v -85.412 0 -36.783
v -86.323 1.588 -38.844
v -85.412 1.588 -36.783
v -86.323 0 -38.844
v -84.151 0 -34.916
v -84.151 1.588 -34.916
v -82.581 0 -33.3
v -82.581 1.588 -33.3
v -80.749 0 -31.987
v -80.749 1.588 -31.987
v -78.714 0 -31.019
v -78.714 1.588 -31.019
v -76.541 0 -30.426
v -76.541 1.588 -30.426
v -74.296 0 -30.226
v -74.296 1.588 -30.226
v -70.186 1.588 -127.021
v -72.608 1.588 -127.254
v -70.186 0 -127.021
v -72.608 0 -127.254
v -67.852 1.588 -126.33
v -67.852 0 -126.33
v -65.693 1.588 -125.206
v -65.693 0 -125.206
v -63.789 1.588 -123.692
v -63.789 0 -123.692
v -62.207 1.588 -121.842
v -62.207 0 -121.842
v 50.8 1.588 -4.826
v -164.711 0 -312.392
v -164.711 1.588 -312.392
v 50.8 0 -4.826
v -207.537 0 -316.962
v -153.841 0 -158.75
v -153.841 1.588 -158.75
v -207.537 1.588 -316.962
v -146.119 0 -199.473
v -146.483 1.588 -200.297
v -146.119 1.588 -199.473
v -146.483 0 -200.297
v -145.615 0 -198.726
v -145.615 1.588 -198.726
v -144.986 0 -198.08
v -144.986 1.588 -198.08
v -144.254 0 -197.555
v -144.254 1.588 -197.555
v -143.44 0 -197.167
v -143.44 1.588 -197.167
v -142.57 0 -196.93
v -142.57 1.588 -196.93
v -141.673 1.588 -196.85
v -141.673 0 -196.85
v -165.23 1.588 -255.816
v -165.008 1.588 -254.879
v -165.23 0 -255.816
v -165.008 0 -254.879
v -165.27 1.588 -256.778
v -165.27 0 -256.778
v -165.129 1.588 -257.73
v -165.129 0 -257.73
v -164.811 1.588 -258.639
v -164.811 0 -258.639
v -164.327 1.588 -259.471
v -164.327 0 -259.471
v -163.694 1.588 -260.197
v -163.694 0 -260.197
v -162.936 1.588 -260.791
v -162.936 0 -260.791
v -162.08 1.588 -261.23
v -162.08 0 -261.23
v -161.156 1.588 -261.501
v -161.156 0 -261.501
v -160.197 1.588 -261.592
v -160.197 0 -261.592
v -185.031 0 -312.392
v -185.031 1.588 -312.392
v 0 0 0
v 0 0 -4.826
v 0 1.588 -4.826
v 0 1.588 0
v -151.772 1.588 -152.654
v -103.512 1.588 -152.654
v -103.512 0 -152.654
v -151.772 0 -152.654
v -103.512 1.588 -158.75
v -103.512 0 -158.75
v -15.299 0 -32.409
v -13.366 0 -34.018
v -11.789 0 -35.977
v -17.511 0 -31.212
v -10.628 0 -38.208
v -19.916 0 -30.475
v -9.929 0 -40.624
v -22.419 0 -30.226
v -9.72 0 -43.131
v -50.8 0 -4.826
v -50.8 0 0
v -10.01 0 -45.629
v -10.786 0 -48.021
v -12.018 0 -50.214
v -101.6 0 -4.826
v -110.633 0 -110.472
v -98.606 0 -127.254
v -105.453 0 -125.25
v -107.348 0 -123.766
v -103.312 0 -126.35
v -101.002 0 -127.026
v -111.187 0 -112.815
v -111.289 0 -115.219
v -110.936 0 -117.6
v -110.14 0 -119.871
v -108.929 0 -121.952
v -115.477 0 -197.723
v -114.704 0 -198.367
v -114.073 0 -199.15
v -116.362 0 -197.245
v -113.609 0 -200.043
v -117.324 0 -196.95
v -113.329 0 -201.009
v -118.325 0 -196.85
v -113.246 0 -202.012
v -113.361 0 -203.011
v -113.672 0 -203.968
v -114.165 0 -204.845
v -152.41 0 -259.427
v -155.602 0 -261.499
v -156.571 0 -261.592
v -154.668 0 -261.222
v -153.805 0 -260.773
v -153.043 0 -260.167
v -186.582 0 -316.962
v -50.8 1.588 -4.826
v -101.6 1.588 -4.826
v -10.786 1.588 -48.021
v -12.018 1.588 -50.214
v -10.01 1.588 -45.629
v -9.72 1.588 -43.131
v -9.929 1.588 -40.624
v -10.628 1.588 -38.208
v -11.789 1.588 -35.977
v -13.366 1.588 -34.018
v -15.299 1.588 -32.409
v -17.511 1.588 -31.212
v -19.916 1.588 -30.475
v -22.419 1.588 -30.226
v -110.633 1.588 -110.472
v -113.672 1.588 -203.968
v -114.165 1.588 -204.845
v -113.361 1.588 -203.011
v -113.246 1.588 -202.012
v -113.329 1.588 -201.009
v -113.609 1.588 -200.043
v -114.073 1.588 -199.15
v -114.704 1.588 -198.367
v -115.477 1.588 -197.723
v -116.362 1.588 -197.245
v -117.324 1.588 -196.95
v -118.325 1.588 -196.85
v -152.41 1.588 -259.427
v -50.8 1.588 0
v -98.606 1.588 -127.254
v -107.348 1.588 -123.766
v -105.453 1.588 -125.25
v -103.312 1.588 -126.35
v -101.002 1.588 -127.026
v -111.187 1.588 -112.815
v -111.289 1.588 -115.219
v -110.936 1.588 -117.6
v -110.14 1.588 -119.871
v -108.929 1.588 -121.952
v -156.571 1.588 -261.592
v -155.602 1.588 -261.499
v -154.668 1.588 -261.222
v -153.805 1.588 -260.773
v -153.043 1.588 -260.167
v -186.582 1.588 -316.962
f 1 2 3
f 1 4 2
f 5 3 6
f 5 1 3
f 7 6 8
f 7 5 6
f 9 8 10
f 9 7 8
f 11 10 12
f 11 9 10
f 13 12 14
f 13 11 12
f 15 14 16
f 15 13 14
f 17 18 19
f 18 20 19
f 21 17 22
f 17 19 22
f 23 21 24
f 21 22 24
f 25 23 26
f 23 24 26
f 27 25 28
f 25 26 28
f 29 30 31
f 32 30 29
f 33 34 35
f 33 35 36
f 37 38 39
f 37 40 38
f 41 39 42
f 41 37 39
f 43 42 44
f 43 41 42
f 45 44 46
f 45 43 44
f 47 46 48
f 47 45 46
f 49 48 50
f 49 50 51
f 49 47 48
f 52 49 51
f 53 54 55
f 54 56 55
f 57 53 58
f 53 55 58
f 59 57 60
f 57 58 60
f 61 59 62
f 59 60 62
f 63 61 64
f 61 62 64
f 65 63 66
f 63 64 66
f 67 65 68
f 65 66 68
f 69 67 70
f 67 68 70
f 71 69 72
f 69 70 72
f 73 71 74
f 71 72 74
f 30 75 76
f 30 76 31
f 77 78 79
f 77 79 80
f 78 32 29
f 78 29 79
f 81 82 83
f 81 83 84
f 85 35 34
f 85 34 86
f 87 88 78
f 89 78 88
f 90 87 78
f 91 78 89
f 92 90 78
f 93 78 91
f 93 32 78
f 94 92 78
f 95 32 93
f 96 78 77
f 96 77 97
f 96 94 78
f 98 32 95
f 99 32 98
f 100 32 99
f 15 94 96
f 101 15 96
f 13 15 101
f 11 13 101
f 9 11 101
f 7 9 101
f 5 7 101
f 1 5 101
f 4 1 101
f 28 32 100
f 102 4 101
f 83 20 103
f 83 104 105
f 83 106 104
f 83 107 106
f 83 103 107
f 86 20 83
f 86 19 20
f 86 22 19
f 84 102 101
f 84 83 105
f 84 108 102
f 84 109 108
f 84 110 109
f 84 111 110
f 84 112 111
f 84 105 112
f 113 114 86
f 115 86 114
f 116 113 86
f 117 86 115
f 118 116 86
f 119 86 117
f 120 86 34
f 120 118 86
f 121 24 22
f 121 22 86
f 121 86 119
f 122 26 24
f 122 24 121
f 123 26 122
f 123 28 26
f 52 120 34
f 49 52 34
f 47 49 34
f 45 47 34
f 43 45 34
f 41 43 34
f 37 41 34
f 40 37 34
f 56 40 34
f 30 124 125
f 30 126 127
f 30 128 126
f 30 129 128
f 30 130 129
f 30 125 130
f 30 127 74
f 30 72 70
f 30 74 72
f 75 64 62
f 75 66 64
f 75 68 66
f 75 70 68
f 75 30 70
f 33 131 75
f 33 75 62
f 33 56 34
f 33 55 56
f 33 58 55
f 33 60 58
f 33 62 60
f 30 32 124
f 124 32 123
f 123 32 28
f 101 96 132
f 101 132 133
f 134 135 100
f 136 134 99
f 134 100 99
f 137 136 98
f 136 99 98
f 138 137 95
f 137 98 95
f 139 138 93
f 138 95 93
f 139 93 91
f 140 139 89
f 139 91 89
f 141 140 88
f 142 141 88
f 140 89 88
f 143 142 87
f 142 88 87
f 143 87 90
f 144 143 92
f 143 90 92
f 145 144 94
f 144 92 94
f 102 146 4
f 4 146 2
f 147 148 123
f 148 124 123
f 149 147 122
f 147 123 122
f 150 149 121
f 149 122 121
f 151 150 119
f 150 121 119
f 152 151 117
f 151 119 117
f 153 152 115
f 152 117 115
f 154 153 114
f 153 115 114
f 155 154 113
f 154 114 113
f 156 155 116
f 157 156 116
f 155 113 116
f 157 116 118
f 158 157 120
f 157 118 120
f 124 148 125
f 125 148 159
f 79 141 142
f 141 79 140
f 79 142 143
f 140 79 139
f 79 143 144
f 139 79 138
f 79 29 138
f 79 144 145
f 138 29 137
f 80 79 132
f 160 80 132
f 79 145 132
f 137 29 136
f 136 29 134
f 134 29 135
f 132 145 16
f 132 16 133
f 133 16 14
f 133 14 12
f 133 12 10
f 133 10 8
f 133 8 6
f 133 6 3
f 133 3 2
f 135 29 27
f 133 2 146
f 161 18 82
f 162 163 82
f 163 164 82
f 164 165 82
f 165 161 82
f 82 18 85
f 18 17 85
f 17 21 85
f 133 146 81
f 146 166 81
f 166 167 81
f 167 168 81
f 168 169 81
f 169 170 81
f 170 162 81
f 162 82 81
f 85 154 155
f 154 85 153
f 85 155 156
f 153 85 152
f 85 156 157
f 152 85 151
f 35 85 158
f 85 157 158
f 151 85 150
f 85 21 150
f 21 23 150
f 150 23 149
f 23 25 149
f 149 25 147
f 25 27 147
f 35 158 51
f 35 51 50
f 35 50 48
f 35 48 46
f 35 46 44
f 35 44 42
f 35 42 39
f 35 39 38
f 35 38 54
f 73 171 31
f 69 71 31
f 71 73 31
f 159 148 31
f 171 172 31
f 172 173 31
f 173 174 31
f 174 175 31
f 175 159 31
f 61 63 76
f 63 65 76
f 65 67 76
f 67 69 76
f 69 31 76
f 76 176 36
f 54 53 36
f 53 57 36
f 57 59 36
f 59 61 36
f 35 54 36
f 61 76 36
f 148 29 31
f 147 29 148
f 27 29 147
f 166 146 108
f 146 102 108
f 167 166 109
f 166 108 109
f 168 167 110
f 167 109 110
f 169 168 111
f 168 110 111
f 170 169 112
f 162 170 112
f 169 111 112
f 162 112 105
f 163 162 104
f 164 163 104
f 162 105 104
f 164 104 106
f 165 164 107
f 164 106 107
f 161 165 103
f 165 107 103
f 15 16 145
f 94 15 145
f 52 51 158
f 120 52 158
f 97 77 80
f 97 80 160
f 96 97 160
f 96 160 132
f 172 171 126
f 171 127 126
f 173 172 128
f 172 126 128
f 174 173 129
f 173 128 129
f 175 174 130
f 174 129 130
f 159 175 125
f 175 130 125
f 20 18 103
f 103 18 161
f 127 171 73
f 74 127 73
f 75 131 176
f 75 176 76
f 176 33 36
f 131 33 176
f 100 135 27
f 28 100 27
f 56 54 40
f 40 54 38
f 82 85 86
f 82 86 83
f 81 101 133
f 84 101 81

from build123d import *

# Parameters (mm, degrees)
BOSS_EXTRUDE1_DEPTH = 1.5875
CUT_EXTRUDE1_DEPTH  = 379.865331816
CUT_EXTRUDE2_DEPTH  = 379.865331816
FILLET1_R           = 12.7
FILLET2_R           = 5.08


with BuildPart() as part:
    # Sketch1 → Boss-Extrude1 (new body)
    with BuildSketch(Plane(origin=(0, 0, 0), x_dir=(1, 0, 0), z_dir=(0, 1, 0))):
        Polygon((-207.536668491, 316.962065124), (-186.581668491, 316.962065124), (-185.030654327, 312.392094548), (-164.710654327, 312.392094548), (50.8, 4.826), (0, 4.826), (0, 0), (-50.8, 0), (-50.8, 4.826), (-101.6, 4.826), align=None)
    extrude(amount=BOSS_EXTRUDE1_DEPTH)

    # Sketch2 → Cut-Extrude1 (cut, through all)
    with BuildSketch(Plane(origin=(0, 1.5875, 0), x_dir=(1, 0, 0), z_dir=(0, 1, 0))):
        Polygon((-103.511728228, 158.75), (-103.511728228, 152.654), (-151.771728228, 152.654), (-153.840665475, 158.75), align=None)
    extrude(amount=-CUT_EXTRUDE1_DEPTH, mode=Mode.SUBTRACT)

    # Sketch3 → Cut-Extrude2 (cut, through all)
    with BuildSketch(Plane(origin=(0, 1.5875, 0), x_dir=(1, 0, 0), z_dir=(0, 1, 0))):
        Polygon((-116.328139028, 127.254), (-83.397554521, 30.226), (1.987487188, 30.226), (-65.999745926, 127.254), align=None)
        Polygon((-167.286096734, 261.592094548), (-145.313109394, 196.85), (-108.562496075, 196.85), (-153.927090567, 261.592094548), align=None)
    extrude(amount=-CUT_EXTRUDE2_DEPTH, mode=Mode.SUBTRACT)

    # Fillet1
    fillet1_edges = [part.edges().sort_by_distance(p)[0] for p in [
        (-116.328139028, 0.79375, -127.254),
        (-65.999745926, 0.79375, -127.254),
        (1.987487188, 0.79375, -30.226),
        (-83.397554521, 0.79375, -30.226),
    ]]
    fillet(fillet1_edges, radius=FILLET1_R)

    # Fillet2
    fillet2_edges = [part.edges().sort_by_distance(p)[0] for p in [
        (-167.286096734, 0.79375, -261.592094548),
        (-153.927090567, 0.79375, -261.592094548),
        (-108.562496075, 0.79375, -196.85),
        (-145.313109394, 0.79375, -196.85),
    ]]
    fillet(fillet2_edges, radius=FILLET2_R)


solid = part.part
